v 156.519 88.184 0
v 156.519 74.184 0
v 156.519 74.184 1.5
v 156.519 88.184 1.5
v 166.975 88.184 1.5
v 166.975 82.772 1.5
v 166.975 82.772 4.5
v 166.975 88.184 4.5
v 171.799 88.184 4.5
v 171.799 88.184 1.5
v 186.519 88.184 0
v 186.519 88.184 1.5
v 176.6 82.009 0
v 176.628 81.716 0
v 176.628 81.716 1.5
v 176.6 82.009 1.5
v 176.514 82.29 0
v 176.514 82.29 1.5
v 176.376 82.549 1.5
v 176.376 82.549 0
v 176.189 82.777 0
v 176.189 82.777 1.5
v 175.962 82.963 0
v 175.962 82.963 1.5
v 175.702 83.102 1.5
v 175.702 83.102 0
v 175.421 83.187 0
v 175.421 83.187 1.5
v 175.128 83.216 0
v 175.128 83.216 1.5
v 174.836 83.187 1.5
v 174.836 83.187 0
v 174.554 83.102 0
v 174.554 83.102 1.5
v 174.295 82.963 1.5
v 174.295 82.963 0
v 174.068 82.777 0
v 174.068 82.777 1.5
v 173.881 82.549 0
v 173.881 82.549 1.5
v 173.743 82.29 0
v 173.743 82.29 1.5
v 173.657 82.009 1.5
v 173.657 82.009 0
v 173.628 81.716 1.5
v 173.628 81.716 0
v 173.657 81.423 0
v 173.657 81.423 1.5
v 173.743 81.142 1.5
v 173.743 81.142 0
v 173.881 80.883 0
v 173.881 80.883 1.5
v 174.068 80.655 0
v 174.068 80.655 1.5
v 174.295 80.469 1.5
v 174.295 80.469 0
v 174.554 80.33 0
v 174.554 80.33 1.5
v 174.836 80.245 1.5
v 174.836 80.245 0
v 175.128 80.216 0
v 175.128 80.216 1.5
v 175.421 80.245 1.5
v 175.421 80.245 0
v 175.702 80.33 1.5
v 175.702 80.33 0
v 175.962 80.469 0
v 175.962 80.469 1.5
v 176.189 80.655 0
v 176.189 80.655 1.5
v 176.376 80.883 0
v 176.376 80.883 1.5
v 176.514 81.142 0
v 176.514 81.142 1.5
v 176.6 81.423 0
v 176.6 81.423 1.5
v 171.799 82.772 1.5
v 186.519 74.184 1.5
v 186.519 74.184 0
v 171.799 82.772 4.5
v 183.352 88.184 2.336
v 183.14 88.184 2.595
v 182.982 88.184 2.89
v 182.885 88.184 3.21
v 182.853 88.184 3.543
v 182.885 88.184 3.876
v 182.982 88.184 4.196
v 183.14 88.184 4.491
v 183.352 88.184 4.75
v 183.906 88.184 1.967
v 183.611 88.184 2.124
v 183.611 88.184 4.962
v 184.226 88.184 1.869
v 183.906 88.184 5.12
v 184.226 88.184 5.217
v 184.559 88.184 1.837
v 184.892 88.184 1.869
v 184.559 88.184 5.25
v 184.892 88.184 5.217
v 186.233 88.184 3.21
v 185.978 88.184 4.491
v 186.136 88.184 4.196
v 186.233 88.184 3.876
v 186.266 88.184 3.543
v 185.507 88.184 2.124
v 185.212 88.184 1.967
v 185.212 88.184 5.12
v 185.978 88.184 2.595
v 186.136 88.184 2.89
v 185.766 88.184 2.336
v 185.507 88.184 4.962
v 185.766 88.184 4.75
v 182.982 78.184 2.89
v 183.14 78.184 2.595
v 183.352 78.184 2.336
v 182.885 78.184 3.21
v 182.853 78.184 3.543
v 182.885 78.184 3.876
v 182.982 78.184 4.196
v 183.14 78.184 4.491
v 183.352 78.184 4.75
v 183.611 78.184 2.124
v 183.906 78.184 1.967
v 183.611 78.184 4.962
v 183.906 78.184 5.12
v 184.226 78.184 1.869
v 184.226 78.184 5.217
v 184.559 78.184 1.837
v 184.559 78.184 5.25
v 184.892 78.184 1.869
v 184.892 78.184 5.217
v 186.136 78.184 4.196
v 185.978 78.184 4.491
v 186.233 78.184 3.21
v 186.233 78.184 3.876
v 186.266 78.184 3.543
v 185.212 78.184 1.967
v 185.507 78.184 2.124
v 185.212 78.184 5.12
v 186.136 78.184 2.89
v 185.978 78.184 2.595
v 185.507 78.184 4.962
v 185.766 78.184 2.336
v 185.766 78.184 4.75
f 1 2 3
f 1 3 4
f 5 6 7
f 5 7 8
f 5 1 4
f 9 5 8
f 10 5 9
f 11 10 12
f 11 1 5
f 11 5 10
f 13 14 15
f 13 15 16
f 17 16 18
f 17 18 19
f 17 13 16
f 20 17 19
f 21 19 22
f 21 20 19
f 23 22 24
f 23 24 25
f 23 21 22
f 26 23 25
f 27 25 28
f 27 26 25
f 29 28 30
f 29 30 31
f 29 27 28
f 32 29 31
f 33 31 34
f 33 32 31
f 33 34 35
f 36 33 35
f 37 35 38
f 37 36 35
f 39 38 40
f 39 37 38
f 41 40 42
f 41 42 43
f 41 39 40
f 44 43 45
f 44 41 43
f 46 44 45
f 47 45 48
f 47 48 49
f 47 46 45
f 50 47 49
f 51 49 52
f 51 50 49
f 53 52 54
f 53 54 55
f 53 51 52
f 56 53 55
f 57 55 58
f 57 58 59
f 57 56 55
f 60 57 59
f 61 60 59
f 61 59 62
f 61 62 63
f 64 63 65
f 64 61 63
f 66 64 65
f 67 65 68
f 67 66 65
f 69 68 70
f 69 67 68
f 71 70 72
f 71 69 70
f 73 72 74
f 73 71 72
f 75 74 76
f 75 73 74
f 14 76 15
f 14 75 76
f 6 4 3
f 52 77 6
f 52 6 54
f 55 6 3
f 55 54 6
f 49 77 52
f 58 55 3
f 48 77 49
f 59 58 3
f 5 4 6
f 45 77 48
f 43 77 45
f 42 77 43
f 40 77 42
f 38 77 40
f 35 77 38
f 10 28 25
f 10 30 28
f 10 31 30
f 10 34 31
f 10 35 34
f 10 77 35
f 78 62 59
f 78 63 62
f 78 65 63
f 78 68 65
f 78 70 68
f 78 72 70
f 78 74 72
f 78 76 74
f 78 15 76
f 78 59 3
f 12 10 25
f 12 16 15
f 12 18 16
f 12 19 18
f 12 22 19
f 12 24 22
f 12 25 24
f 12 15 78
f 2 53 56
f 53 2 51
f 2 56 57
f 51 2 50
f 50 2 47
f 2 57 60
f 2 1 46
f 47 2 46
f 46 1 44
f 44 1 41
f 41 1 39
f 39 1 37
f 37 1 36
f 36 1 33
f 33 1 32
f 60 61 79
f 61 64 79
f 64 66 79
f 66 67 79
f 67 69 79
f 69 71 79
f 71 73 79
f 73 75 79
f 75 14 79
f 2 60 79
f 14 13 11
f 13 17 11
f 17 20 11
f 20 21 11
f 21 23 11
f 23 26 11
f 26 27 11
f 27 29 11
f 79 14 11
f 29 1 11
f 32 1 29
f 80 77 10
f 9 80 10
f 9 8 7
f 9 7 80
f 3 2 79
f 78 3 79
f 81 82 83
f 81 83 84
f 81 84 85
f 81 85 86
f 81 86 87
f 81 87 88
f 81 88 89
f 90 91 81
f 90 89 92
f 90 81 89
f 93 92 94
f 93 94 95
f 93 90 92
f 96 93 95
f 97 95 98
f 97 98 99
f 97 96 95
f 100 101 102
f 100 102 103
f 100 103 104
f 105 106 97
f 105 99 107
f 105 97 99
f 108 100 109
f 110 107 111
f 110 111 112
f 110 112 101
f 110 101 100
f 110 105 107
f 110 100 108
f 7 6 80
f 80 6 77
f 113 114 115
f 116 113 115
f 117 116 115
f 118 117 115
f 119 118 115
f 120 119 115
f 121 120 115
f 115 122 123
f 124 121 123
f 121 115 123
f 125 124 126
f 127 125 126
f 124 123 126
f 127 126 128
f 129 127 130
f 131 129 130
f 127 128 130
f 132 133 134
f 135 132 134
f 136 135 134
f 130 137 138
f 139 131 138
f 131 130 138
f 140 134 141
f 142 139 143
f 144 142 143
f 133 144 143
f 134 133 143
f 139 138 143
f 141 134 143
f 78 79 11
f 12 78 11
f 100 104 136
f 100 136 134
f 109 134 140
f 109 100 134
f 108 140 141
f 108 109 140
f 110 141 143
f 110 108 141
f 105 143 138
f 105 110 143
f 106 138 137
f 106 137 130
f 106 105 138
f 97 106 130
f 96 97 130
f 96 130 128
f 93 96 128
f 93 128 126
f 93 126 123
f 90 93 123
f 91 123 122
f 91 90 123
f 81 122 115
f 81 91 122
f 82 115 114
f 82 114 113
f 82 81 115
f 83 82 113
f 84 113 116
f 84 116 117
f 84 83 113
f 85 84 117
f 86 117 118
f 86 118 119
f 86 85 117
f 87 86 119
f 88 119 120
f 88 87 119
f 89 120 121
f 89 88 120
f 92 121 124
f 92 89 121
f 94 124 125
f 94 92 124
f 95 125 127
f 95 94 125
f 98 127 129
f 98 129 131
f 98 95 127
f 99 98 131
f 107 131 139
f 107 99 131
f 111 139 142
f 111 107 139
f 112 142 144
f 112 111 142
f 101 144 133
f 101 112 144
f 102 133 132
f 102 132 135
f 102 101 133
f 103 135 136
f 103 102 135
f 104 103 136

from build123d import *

# Parameters (mm, degrees)
SKETCH1_W           = 30
SKETCH1_H           = 14
SKETCH1_R           = 1.5
BOSS_EXTRUDE1_DEPTH = 1.5
SKETCH2_W           = 4.823839664
SKETCH2_H           = 5.412112793
BOSS_EXTRUDE2_DEPTH = 3
SKETCH3_R           = 1.706533857
BOSS_EXTRUDE3_DEPTH = 10


with BuildPart() as part:
    # Sketch1 → Boss-Extrude1 (new body)
    with BuildSketch(Plane.XY):
        with Locations((171.518802712, 81.184347227)):
            Rectangle(SKETCH1_W, SKETCH1_H)
        with Locations((175.128446175, 81.715874023)):
            Circle(SKETCH1_R, mode=Mode.SUBTRACT)
    extrude(amount=BOSS_EXTRUDE1_DEPTH)

    # Sketch2 → Boss-Extrude2 (add)
    with BuildSketch(Plane.XY.offset(1.5)):
        with Locations((169.386934045, 85.478290831)):
            Rectangle(SKETCH2_W, SKETCH2_H)
    extrude(amount=BOSS_EXTRUDE2_DEPTH)


with BuildPart() as body_2:
    # Sketch3 → Boss-Extrude3 (new body)
    with BuildSketch(Plane(origin=(0, 88.184347227, 0), x_dir=(1, 0, 0), z_dir=(0, 1, 0))):
        with Locations((184.559078961, -3.543177059)):
            Circle(SKETCH3_R)
    extrude(amount=-BOSS_EXTRUDE3_DEPTH)


solid = Compound([part.part, body_2.part])
